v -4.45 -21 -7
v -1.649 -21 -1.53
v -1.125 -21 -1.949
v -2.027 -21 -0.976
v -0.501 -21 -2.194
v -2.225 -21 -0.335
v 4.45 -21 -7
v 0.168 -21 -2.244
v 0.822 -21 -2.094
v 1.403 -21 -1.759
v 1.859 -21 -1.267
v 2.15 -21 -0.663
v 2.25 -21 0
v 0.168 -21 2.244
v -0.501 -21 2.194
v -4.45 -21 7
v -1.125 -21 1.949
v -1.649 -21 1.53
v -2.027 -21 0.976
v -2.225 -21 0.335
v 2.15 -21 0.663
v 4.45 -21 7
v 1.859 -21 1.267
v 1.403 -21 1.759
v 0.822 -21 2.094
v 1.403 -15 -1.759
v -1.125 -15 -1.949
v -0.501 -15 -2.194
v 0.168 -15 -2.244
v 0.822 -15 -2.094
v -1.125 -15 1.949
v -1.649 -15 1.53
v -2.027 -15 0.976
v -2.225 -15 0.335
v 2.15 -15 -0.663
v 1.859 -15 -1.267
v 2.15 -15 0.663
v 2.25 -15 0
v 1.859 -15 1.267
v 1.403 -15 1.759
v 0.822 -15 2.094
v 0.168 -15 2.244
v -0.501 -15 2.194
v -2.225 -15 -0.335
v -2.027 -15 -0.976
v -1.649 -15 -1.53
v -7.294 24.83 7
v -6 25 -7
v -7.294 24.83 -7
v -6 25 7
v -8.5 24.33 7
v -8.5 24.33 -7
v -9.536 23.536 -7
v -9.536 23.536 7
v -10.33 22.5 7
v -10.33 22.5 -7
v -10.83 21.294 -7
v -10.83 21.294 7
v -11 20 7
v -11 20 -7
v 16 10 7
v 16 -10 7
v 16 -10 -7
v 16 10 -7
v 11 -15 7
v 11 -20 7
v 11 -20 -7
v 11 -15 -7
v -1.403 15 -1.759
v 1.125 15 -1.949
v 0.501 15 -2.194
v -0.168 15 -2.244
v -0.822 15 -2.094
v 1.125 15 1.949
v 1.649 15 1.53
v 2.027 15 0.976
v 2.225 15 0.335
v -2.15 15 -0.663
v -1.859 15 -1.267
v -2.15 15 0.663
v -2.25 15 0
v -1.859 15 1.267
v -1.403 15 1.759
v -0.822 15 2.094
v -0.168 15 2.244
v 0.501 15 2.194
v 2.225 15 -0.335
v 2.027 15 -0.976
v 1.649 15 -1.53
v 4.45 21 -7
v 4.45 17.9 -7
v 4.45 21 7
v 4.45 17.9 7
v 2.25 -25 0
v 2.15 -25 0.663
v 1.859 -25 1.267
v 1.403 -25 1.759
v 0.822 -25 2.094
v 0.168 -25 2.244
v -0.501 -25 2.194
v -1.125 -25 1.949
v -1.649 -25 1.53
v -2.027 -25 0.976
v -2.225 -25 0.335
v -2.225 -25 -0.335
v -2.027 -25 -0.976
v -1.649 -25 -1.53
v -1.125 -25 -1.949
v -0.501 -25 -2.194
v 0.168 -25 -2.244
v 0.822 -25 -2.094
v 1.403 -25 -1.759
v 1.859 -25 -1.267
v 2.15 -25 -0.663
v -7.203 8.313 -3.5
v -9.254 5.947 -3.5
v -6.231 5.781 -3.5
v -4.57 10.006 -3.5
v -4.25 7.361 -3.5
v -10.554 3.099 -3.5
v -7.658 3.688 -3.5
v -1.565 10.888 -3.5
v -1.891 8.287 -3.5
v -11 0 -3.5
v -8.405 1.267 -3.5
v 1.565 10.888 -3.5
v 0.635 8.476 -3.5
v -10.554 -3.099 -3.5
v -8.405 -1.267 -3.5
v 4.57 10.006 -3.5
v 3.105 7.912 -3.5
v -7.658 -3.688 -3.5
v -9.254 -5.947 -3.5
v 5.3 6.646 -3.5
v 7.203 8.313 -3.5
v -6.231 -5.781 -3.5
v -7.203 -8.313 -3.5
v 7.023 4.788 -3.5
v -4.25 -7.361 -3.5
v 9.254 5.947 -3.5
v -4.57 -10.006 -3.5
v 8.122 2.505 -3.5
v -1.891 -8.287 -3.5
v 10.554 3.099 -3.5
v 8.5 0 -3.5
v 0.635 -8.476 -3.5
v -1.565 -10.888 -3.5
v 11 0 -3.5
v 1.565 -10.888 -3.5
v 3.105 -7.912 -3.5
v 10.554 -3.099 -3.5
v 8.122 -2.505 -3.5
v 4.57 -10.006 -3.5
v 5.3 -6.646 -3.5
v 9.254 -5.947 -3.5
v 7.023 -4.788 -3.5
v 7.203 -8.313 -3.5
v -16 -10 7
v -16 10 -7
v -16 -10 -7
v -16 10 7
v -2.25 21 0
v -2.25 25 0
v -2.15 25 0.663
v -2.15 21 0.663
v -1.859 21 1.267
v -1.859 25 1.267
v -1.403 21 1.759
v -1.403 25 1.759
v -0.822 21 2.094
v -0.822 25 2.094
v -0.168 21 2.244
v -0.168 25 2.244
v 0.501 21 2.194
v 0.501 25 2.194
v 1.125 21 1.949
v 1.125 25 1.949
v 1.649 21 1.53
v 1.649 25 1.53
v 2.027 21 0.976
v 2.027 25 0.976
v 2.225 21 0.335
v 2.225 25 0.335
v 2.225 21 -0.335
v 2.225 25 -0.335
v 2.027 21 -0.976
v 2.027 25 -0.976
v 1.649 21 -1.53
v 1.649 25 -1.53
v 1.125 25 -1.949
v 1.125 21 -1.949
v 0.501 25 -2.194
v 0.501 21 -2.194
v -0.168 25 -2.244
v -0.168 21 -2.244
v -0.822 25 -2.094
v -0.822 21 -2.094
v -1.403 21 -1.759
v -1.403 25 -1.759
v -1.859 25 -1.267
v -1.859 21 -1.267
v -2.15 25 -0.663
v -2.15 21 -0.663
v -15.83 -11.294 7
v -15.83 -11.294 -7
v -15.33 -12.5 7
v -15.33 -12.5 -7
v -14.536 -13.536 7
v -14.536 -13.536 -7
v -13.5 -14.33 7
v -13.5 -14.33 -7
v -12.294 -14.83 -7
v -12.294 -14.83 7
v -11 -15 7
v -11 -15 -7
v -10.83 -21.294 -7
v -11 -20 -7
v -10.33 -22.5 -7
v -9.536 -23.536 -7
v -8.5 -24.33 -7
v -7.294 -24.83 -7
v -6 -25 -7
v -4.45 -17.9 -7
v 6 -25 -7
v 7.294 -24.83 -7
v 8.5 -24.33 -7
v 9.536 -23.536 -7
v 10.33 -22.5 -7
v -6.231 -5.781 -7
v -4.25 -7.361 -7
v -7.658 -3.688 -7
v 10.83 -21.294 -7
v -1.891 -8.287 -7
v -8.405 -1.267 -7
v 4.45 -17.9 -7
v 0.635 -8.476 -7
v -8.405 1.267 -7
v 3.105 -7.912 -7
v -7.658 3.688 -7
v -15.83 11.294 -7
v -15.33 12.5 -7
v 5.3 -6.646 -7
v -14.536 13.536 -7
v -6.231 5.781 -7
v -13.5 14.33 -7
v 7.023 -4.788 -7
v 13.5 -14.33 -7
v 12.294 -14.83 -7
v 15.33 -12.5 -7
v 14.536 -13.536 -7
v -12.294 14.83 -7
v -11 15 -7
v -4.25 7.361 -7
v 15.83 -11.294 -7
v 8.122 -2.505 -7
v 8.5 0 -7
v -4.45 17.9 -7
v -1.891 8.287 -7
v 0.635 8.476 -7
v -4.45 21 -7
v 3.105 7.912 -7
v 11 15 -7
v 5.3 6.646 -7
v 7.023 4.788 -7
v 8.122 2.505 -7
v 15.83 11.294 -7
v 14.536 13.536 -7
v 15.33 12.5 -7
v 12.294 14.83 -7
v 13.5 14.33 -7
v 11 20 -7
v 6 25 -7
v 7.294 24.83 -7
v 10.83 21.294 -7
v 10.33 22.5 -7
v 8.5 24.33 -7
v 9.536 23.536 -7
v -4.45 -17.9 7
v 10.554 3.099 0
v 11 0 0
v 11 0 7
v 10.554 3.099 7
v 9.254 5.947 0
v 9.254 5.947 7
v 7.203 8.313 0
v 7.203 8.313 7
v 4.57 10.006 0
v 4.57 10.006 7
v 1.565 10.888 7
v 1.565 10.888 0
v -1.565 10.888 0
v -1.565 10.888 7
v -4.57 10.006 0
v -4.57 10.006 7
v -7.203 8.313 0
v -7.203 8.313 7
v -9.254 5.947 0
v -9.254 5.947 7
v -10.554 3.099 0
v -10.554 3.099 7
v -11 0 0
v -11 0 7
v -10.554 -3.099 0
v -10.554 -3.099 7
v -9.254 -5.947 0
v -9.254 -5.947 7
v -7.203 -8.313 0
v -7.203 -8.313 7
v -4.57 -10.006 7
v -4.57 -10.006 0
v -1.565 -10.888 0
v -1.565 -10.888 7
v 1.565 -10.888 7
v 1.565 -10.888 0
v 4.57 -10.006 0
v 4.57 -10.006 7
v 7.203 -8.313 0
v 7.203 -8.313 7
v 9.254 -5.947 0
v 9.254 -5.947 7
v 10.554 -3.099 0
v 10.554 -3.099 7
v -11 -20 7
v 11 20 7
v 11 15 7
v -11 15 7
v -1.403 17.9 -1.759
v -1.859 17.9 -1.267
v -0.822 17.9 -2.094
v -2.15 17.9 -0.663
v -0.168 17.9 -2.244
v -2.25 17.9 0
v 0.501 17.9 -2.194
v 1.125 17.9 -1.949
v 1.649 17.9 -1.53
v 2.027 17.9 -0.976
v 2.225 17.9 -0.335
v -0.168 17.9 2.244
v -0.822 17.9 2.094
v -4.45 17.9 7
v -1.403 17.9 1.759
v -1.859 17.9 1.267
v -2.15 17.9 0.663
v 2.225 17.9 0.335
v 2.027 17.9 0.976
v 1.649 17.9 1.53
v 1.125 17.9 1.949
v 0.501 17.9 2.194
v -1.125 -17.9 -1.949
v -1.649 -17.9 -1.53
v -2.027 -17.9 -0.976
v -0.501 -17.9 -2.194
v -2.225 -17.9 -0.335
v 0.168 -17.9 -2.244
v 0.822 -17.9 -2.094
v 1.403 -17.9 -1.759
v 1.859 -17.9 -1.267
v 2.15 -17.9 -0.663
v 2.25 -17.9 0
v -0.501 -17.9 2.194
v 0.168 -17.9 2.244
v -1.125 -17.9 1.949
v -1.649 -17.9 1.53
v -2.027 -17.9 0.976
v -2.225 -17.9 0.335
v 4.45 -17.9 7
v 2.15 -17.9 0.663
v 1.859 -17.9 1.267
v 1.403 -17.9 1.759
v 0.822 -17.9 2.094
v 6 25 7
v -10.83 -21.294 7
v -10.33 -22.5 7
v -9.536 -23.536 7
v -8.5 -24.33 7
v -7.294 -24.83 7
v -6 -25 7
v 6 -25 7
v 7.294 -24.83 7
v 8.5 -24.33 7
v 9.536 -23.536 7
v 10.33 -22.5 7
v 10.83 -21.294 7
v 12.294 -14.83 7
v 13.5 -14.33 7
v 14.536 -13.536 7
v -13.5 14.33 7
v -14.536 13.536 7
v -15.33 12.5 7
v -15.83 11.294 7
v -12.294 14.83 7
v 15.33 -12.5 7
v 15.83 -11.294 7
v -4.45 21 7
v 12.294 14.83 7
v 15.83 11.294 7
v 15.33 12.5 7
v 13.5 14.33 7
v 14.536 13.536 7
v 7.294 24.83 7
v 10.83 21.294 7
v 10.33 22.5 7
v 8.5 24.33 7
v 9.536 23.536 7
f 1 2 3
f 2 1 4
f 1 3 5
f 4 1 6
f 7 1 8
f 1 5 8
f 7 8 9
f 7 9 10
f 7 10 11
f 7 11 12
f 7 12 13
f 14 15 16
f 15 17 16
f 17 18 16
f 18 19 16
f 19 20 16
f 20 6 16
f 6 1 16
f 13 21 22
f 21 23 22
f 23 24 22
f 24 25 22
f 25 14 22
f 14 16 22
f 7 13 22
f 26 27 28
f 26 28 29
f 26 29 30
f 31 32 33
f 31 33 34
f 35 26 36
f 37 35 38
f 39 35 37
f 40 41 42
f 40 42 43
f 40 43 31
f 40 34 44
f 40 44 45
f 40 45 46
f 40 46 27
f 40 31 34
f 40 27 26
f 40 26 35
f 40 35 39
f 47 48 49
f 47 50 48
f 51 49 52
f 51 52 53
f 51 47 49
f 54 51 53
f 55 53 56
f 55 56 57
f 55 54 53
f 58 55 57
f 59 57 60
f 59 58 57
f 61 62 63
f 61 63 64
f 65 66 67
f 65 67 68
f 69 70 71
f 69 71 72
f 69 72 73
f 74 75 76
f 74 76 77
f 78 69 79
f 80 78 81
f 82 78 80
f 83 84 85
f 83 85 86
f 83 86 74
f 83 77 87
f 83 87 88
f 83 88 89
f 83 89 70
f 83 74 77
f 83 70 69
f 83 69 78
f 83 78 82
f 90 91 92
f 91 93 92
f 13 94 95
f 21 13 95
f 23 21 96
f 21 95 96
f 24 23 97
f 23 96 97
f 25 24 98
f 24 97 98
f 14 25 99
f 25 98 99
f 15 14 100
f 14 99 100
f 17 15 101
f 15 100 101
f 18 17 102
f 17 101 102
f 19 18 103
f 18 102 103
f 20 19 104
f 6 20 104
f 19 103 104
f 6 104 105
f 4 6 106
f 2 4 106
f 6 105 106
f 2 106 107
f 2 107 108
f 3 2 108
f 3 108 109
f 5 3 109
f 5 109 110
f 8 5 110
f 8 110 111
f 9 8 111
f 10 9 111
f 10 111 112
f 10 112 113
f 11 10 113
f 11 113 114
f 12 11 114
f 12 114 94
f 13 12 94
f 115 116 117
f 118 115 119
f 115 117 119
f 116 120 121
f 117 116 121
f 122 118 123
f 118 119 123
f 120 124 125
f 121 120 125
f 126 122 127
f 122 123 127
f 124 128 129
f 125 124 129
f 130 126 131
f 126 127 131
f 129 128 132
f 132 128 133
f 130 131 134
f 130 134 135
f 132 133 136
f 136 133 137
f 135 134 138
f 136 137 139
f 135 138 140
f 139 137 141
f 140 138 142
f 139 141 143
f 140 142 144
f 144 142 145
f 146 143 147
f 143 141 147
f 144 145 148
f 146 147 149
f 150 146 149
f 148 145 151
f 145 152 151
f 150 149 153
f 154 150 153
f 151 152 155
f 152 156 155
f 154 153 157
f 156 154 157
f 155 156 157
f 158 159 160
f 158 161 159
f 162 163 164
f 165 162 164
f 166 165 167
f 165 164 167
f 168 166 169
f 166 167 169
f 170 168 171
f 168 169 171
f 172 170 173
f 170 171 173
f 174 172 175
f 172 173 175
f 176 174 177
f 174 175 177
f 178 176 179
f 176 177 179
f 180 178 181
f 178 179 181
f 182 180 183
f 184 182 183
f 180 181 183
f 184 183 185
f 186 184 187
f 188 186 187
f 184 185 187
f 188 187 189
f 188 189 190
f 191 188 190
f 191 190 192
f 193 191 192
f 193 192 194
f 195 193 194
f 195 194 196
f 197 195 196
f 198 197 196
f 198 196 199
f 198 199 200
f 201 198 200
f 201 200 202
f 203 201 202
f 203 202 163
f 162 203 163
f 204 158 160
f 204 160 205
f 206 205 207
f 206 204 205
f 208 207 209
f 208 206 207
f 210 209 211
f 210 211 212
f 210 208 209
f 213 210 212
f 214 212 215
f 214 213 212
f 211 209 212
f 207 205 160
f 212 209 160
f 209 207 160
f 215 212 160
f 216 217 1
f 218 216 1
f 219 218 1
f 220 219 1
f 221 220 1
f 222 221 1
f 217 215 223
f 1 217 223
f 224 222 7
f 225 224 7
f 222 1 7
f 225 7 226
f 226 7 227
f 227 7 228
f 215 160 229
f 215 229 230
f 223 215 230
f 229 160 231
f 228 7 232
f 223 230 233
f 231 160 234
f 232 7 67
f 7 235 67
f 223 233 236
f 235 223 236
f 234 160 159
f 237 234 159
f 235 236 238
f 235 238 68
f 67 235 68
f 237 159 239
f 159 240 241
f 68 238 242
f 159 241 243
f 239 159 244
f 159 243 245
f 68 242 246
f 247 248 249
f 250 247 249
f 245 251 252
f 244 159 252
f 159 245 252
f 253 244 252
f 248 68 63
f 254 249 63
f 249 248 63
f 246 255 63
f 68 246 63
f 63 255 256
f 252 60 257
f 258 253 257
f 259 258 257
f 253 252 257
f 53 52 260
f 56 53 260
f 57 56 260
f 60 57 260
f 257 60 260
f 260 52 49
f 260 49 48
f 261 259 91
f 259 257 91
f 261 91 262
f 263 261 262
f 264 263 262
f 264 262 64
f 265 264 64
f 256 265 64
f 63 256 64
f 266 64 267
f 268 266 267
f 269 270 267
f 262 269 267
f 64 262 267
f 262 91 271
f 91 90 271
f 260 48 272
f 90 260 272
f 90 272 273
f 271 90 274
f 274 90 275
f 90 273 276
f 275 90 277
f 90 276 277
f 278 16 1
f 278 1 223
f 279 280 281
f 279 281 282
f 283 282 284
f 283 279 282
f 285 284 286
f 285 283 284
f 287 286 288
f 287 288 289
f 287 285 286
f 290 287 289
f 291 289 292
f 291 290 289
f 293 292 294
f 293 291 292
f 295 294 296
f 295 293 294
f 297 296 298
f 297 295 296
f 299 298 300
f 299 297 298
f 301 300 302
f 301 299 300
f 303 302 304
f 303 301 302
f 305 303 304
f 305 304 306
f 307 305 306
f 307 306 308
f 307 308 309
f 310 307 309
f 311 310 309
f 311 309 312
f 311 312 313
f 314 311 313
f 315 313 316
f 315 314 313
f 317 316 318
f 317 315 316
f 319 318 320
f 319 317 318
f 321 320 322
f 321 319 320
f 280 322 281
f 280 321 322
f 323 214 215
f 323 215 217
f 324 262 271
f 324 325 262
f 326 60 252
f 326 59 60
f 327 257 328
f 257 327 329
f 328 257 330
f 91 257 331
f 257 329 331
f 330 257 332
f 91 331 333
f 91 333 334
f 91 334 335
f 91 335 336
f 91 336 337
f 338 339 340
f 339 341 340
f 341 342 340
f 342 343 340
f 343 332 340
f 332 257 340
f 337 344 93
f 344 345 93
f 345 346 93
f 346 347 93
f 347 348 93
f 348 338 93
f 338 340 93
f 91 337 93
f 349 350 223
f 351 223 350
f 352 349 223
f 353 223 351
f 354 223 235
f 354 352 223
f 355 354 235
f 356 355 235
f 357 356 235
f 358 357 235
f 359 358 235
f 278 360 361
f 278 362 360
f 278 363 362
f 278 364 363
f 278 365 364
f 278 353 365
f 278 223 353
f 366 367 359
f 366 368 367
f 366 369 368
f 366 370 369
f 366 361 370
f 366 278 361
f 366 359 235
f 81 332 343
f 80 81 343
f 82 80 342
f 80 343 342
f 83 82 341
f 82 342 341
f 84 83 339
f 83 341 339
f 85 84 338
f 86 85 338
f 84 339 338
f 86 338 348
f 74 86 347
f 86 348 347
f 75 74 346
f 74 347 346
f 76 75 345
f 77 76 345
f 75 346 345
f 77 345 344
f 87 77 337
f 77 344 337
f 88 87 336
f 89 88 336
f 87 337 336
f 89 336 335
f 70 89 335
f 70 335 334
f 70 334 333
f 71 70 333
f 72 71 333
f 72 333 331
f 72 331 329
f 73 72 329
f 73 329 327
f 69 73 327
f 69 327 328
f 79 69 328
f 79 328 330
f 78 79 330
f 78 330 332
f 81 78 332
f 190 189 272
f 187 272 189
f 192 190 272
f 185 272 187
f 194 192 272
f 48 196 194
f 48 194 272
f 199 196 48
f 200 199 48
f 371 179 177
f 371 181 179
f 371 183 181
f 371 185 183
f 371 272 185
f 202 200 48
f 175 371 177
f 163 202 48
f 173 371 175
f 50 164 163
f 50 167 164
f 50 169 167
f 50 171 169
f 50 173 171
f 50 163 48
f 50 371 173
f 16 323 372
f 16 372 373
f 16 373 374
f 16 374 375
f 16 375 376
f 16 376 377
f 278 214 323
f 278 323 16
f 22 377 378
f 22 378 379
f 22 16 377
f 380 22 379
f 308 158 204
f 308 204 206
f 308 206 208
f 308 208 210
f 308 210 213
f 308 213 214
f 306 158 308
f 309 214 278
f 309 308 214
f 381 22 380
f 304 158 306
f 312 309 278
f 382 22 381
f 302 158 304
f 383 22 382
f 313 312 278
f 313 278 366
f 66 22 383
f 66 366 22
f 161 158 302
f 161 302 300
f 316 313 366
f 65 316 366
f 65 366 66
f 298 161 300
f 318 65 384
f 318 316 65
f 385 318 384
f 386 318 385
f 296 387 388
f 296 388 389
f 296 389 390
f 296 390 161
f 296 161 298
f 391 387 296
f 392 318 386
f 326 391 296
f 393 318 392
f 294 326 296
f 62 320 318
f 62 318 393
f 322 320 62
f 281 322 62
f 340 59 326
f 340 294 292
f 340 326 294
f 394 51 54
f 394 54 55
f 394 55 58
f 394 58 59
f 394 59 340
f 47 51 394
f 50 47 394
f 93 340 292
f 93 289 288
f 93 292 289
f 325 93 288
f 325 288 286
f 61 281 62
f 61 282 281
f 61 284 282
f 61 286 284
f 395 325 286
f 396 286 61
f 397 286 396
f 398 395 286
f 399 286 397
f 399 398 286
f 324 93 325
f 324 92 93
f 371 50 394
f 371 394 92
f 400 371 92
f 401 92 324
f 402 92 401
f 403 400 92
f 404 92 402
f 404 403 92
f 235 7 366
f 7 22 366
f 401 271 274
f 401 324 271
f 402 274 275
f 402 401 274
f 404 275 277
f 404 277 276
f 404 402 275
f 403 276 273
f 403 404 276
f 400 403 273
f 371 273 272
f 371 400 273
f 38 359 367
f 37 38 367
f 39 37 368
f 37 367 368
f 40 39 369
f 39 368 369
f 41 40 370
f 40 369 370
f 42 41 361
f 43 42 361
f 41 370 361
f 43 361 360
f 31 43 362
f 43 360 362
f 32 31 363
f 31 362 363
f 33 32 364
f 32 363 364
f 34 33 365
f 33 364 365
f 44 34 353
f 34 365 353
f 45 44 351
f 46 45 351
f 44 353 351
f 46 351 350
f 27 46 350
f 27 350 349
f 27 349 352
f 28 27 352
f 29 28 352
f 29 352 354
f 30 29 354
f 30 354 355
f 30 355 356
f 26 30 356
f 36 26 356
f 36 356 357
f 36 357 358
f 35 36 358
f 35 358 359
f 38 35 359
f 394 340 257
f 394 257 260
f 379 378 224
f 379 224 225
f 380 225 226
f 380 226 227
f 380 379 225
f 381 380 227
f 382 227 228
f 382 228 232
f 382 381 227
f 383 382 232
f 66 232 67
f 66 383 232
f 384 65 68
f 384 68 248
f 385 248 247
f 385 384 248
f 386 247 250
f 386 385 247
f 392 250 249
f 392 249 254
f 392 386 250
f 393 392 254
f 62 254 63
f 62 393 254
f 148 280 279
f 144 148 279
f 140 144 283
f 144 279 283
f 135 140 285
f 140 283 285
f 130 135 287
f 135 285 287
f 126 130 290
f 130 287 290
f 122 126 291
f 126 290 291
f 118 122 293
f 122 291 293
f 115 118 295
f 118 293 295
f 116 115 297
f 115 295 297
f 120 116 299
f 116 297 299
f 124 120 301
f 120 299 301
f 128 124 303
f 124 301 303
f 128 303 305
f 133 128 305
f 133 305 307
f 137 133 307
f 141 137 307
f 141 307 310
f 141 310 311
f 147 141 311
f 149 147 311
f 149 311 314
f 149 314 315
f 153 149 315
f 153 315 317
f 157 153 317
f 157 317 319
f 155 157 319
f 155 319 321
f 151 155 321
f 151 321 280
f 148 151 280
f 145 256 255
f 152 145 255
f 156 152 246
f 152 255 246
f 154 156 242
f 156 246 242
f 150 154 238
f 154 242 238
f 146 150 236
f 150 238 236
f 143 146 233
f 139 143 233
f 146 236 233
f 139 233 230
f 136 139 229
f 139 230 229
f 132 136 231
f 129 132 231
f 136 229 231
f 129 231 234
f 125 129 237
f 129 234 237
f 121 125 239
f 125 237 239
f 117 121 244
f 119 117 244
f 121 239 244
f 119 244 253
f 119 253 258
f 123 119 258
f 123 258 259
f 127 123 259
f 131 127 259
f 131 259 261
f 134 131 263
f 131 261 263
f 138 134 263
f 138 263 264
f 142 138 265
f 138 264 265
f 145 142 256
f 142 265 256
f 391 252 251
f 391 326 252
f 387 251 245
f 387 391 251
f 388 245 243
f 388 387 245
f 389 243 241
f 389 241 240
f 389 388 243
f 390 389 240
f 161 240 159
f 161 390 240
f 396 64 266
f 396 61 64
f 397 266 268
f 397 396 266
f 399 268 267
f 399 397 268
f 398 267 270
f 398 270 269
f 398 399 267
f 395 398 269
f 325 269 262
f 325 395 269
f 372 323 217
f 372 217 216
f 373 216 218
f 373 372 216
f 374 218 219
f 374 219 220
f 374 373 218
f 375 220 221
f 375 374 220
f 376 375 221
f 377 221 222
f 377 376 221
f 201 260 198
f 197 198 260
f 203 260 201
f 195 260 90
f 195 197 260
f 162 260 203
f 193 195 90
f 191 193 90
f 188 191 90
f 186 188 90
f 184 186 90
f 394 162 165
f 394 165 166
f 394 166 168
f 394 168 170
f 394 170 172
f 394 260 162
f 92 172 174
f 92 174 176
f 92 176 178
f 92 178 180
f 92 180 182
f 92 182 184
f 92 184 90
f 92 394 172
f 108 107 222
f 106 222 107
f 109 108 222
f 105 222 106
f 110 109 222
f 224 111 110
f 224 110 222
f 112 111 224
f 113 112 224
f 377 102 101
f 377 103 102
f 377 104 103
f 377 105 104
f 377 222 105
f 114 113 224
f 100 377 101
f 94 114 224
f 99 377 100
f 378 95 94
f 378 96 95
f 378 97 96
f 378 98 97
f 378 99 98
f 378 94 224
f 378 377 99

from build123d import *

# Parameters (mm, degrees)
F0_W          = 8.9
F0_H          = 3.1
F0_R          = 11
F1_DEPTH      = 7
F1_DEPTH_BACK = 7
F2_R          = 2.25
F3_DEPTH      = 10
F4_R          = 2.25
F5_DEPTH      = 10
F6_R          = 11.25
F6_R_2        = 8.5
F7_DEPTH      = 3.5


with BuildPart() as f1:
    # F0 (on Top) → F1 (new body, two sides)
    with BuildSketch(Plane.XY) as f1_sk:
        with BuildLine():
            Line((-16, 10), (-16, -10))
            ThreePointArc((-16, -10), (-14.535534, -13.535534), (-11, -15))
            Line((-11, -15), (-11, -20))
            ThreePointArc((-11, -20), (-9.535534, -23.535534), (-6, -25))
            Line((-6, -25), (6, -25))
            ThreePointArc((6, -25), (9.535534, -23.535534), (11, -20))
            Line((11, -20), (11, -15))
            ThreePointArc((11, -15), (14.535534, -13.535534), (16, -10))
            Line((16, -10), (16, 10))
            ThreePointArc((16, 10), (14.535534, 13.535534), (11, 15))
            Line((11, 15), (11, 20))
            ThreePointArc((11, 20), (9.535534, 23.535534), (6, 25))
            Line((6, 25), (-6, 25))
            ThreePointArc((-6, 25), (-9.535534, 23.535534), (-11, 20))
            Line((-11, 20), (-11, 15))
            ThreePointArc((-11, 15), (-14.535534, 13.535534), (-16, 10))
        make_face()
        with Locations((0, -19.45)):
            Rectangle(F0_W, F0_H, mode=Mode.SUBTRACT)
        Circle(F0_R, mode=Mode.SUBTRACT)
        with Locations((0, 19.45)):
            Rectangle(F0_W, F0_H, mode=Mode.SUBTRACT)
    extrude(amount=F1_DEPTH)
    extrude(f1_sk.sketch, amount=-F1_DEPTH_BACK)

    # F2 (on face) → F3 (cut)
    with BuildSketch(Plane.XZ.offset(25)):
        Circle(F2_R)
    extrude(amount=-F3_DEPTH, mode=Mode.SUBTRACT)

    # F4 (on face) → F5 (cut)
    with BuildSketch(Plane(origin=(0, 25, 0), x_dir=(-1, 0, 0), z_dir=(0, 1, 0))):
        Circle(F4_R)
    extrude(amount=-F5_DEPTH, mode=Mode.SUBTRACT)

    # F6 (on face) → F7 (join)
    with BuildSketch(Plane(origin=(0, 0, -7), x_dir=(1, 0, 0), z_dir=(0, 0, -1))):
        Circle(F6_R)
        Circle(F6_R_2, mode=Mode.SUBTRACT)
    extrude(amount=-F7_DEPTH)


solid = f1.part
